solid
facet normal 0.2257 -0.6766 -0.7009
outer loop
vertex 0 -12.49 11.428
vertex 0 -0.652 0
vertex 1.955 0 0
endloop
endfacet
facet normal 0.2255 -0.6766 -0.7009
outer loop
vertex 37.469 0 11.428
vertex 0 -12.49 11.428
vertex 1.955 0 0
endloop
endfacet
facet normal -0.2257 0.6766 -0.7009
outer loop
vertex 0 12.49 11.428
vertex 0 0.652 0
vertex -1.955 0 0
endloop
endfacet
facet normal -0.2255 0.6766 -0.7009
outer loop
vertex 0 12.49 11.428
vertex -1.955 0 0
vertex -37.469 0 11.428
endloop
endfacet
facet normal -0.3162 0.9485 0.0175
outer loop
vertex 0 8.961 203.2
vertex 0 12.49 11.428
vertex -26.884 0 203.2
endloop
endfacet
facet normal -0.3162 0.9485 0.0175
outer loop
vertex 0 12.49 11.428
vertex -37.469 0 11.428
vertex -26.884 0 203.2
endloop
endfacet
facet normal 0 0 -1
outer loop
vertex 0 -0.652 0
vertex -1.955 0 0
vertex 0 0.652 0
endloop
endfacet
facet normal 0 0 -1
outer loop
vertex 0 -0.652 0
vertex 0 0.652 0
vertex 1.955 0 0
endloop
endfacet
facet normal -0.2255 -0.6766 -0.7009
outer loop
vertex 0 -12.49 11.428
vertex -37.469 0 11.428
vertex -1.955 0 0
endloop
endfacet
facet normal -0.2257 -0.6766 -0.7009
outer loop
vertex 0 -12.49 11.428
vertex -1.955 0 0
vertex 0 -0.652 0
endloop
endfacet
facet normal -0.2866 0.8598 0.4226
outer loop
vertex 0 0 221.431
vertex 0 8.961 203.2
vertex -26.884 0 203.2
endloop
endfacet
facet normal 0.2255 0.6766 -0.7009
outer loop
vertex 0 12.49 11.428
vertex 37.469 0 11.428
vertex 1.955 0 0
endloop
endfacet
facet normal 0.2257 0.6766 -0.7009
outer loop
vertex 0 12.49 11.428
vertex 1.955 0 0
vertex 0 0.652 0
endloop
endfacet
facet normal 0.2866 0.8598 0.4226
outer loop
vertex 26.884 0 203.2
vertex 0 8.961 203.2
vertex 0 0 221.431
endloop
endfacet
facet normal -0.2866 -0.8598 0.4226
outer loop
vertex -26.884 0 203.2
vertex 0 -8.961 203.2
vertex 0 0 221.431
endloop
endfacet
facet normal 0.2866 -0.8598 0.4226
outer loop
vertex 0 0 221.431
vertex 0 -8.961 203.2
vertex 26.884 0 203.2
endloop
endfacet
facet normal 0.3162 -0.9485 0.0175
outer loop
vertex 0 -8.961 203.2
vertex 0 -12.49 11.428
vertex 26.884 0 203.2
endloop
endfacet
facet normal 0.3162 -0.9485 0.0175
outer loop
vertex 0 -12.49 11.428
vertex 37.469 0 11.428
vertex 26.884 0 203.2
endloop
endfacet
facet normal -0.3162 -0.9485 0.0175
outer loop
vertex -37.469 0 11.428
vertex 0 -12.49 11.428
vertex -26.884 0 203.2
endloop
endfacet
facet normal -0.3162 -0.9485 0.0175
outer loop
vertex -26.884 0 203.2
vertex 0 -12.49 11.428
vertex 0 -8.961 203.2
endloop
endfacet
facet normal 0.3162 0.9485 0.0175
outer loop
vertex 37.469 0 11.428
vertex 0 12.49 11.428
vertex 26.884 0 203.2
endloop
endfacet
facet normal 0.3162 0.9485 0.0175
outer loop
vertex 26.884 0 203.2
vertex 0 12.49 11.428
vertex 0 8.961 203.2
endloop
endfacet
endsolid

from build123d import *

# Parameters (mm, degrees)
F1_DEPTH = 203.2
F1_TAPER = 1
F2_DEPTH = 25.4
F2_TAPER = 25
F3_SIZE  = 11.43


with BuildPart() as f1:
    # F0 (on Top) → F1 (new body)
    with BuildSketch(Plane.XY):
        Polygon((0, 12.7), (-38.1, 0), (0, -12.7), (38.1, 0), align=None)
    extrude(amount=F1_DEPTH, taper=F1_TAPER)

    # F1_face (on face) → F2 (join)
    with BuildSketch(Plane.XY.offset(203.2)):
        Polygon((0, 8.9612715954), (-26.8838147861, 0), (0, -8.9612715954), (26.8838147861, 0), align=None)
    extrude(amount=F2_DEPTH, taper=F2_TAPER)

    # F3
    f3_edges = [f1.edges().sort_by_distance(p)[0] for p in [
        (-19.05, 6.35, 0),
        (19.05, 6.35, 0),
        (19.05, -6.35, 0),
        (-19.05, -6.35, 0),
    ]]
    chamfer(f3_edges, length=F3_SIZE)


solid = f1.part
